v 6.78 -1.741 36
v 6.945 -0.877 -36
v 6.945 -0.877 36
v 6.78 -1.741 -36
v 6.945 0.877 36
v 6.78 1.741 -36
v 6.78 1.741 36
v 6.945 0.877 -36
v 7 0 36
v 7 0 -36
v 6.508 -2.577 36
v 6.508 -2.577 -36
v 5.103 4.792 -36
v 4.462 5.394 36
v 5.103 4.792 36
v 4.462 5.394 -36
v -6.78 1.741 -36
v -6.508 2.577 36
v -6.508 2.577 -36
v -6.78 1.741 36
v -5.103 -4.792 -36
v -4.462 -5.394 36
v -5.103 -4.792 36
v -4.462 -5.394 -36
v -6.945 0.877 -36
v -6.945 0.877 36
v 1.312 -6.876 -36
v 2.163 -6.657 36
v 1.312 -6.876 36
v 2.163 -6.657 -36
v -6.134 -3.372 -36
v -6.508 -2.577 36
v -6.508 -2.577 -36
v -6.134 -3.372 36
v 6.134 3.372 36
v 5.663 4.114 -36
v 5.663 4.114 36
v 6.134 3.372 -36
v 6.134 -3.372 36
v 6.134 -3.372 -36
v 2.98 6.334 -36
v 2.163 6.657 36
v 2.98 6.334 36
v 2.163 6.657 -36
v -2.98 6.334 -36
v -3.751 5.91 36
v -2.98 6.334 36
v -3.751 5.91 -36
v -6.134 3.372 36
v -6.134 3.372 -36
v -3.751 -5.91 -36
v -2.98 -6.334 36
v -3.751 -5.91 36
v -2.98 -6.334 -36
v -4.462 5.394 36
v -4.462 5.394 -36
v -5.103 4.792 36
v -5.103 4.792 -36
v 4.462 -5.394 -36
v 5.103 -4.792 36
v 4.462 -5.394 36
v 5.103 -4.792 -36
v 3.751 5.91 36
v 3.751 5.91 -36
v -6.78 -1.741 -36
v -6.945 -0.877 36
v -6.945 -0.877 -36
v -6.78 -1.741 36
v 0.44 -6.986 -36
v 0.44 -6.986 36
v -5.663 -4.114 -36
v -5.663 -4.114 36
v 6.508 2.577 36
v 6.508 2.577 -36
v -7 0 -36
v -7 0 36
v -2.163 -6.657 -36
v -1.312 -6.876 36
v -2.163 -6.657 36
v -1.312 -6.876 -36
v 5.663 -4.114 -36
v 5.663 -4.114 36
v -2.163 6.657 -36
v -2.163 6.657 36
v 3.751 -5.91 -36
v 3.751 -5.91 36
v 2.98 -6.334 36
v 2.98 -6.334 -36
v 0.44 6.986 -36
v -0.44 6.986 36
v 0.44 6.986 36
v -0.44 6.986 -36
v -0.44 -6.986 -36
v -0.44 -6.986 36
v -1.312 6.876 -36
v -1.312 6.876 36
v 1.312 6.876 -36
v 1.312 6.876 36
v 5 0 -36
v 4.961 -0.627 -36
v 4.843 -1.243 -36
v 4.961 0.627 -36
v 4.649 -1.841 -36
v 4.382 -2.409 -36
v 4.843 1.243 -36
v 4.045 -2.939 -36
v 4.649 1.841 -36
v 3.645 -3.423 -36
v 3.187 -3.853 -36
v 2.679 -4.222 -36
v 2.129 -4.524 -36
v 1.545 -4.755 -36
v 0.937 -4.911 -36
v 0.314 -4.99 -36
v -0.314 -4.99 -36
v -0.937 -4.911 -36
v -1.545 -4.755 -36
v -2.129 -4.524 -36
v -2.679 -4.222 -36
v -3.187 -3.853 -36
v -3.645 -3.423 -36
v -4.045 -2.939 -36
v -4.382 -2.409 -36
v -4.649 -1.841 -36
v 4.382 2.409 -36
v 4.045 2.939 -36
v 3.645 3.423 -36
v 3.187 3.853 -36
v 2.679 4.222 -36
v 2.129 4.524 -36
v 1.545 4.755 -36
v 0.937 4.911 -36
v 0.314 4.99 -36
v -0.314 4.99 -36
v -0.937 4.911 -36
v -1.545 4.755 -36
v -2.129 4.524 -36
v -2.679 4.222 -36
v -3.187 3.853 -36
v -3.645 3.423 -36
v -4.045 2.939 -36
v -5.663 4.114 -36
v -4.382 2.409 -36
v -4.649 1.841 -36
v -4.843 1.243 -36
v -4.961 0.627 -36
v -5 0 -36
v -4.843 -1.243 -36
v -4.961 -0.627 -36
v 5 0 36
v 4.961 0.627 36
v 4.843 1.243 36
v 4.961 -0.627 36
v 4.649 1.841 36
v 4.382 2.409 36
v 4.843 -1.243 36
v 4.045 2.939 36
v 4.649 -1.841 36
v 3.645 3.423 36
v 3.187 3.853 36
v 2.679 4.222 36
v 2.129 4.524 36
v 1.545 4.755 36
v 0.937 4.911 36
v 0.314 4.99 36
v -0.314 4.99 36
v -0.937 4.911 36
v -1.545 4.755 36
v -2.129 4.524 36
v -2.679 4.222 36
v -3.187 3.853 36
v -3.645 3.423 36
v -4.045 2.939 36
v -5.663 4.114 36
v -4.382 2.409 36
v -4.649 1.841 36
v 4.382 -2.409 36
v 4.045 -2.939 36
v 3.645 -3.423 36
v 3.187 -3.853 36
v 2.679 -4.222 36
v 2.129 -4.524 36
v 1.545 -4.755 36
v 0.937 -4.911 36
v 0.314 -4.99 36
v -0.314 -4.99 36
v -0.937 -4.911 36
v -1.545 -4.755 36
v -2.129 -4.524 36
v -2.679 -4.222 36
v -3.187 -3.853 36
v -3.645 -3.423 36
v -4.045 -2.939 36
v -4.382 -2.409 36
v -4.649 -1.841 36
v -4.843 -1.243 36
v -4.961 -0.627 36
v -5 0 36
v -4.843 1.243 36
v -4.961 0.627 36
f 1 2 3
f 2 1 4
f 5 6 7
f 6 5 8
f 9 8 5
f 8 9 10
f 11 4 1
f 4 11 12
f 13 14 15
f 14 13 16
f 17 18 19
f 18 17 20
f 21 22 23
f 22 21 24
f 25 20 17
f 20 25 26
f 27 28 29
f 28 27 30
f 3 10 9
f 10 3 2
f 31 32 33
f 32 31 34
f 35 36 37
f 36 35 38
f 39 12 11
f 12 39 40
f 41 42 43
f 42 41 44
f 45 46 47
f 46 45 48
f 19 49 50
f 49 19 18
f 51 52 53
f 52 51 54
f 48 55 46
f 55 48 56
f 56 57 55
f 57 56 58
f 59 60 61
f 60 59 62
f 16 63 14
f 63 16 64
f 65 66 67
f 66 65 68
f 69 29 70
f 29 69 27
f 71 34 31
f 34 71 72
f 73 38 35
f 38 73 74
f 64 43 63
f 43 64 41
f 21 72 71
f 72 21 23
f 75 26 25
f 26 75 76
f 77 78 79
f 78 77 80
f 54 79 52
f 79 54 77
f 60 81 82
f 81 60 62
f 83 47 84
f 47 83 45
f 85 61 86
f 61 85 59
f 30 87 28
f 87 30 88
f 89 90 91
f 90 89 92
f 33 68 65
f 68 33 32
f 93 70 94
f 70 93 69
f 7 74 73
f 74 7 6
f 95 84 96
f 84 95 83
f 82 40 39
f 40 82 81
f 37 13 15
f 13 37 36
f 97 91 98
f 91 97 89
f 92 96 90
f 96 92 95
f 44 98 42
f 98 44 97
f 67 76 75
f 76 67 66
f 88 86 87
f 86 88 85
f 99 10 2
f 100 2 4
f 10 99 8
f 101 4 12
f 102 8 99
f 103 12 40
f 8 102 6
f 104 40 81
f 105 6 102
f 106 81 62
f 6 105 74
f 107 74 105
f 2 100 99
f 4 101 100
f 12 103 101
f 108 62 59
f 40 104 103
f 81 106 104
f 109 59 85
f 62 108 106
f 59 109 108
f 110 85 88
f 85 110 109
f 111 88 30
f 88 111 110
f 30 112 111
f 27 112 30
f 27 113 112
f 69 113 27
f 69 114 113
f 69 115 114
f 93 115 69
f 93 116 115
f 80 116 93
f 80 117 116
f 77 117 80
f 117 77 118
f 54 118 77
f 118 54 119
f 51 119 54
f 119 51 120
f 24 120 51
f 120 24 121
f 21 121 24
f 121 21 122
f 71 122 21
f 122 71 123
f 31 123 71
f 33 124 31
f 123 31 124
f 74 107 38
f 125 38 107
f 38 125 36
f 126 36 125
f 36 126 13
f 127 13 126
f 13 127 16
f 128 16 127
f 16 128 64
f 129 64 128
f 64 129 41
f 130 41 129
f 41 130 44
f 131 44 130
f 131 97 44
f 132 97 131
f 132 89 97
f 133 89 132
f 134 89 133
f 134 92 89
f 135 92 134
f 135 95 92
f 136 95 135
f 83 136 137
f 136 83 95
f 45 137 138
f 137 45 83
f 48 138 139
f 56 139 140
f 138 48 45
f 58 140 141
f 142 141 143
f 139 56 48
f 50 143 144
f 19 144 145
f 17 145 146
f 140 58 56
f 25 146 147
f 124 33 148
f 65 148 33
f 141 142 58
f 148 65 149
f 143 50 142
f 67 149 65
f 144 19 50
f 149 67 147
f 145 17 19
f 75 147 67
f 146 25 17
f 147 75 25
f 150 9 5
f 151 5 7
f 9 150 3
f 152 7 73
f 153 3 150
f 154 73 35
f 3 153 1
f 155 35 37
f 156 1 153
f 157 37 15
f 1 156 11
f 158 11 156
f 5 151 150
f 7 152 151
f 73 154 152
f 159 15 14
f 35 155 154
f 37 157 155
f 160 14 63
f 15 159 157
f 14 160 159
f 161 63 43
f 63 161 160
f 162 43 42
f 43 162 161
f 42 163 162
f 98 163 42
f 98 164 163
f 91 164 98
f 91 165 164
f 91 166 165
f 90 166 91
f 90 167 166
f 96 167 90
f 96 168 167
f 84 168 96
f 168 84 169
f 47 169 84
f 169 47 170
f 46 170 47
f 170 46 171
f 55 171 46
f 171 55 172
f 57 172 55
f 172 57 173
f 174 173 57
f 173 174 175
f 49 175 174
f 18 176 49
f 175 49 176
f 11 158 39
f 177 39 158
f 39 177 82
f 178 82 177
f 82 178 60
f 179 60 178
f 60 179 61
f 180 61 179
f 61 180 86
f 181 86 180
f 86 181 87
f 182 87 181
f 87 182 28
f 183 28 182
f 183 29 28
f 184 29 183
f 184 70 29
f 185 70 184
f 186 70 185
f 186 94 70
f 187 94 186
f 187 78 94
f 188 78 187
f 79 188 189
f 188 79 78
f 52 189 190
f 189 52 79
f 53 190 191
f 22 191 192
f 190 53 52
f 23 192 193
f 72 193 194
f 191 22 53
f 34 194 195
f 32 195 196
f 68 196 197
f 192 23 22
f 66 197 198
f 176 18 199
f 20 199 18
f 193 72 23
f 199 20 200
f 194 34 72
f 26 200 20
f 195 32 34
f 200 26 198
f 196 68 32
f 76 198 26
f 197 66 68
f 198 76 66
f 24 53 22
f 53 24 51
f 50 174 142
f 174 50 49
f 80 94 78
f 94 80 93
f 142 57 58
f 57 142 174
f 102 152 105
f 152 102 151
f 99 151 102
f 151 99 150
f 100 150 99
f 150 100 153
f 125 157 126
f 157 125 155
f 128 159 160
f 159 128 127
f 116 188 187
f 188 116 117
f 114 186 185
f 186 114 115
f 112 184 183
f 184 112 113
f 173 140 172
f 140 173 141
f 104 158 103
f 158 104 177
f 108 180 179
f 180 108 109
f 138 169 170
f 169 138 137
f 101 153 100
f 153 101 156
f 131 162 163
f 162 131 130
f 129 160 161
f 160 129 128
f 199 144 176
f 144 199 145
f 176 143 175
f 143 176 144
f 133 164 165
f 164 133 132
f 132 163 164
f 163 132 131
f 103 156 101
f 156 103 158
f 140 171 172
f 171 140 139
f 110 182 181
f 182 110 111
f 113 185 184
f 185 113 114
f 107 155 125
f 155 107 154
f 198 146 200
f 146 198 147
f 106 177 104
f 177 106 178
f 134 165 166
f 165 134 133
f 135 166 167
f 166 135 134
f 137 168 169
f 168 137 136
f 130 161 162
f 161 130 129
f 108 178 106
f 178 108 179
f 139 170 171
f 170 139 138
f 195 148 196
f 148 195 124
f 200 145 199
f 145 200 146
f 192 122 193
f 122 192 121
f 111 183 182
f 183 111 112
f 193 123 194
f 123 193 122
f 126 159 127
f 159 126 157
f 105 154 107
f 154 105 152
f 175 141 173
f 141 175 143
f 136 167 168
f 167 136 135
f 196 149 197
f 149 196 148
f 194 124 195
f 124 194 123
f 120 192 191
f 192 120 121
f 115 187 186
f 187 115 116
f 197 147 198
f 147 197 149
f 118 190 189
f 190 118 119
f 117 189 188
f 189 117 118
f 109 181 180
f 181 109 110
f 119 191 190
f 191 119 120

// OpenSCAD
$fn = 50;


difference() {
	union() {
		translate(v = [0, 0, -36.0000000000]) {
			cylinder(h = 72, r = 7.0000000000);
		}
	}
	union() {
		translate(v = [0, 0, -100.0000000000]) {
			cylinder(h = 200, r = 5.0000000000);
		}
	}
}
